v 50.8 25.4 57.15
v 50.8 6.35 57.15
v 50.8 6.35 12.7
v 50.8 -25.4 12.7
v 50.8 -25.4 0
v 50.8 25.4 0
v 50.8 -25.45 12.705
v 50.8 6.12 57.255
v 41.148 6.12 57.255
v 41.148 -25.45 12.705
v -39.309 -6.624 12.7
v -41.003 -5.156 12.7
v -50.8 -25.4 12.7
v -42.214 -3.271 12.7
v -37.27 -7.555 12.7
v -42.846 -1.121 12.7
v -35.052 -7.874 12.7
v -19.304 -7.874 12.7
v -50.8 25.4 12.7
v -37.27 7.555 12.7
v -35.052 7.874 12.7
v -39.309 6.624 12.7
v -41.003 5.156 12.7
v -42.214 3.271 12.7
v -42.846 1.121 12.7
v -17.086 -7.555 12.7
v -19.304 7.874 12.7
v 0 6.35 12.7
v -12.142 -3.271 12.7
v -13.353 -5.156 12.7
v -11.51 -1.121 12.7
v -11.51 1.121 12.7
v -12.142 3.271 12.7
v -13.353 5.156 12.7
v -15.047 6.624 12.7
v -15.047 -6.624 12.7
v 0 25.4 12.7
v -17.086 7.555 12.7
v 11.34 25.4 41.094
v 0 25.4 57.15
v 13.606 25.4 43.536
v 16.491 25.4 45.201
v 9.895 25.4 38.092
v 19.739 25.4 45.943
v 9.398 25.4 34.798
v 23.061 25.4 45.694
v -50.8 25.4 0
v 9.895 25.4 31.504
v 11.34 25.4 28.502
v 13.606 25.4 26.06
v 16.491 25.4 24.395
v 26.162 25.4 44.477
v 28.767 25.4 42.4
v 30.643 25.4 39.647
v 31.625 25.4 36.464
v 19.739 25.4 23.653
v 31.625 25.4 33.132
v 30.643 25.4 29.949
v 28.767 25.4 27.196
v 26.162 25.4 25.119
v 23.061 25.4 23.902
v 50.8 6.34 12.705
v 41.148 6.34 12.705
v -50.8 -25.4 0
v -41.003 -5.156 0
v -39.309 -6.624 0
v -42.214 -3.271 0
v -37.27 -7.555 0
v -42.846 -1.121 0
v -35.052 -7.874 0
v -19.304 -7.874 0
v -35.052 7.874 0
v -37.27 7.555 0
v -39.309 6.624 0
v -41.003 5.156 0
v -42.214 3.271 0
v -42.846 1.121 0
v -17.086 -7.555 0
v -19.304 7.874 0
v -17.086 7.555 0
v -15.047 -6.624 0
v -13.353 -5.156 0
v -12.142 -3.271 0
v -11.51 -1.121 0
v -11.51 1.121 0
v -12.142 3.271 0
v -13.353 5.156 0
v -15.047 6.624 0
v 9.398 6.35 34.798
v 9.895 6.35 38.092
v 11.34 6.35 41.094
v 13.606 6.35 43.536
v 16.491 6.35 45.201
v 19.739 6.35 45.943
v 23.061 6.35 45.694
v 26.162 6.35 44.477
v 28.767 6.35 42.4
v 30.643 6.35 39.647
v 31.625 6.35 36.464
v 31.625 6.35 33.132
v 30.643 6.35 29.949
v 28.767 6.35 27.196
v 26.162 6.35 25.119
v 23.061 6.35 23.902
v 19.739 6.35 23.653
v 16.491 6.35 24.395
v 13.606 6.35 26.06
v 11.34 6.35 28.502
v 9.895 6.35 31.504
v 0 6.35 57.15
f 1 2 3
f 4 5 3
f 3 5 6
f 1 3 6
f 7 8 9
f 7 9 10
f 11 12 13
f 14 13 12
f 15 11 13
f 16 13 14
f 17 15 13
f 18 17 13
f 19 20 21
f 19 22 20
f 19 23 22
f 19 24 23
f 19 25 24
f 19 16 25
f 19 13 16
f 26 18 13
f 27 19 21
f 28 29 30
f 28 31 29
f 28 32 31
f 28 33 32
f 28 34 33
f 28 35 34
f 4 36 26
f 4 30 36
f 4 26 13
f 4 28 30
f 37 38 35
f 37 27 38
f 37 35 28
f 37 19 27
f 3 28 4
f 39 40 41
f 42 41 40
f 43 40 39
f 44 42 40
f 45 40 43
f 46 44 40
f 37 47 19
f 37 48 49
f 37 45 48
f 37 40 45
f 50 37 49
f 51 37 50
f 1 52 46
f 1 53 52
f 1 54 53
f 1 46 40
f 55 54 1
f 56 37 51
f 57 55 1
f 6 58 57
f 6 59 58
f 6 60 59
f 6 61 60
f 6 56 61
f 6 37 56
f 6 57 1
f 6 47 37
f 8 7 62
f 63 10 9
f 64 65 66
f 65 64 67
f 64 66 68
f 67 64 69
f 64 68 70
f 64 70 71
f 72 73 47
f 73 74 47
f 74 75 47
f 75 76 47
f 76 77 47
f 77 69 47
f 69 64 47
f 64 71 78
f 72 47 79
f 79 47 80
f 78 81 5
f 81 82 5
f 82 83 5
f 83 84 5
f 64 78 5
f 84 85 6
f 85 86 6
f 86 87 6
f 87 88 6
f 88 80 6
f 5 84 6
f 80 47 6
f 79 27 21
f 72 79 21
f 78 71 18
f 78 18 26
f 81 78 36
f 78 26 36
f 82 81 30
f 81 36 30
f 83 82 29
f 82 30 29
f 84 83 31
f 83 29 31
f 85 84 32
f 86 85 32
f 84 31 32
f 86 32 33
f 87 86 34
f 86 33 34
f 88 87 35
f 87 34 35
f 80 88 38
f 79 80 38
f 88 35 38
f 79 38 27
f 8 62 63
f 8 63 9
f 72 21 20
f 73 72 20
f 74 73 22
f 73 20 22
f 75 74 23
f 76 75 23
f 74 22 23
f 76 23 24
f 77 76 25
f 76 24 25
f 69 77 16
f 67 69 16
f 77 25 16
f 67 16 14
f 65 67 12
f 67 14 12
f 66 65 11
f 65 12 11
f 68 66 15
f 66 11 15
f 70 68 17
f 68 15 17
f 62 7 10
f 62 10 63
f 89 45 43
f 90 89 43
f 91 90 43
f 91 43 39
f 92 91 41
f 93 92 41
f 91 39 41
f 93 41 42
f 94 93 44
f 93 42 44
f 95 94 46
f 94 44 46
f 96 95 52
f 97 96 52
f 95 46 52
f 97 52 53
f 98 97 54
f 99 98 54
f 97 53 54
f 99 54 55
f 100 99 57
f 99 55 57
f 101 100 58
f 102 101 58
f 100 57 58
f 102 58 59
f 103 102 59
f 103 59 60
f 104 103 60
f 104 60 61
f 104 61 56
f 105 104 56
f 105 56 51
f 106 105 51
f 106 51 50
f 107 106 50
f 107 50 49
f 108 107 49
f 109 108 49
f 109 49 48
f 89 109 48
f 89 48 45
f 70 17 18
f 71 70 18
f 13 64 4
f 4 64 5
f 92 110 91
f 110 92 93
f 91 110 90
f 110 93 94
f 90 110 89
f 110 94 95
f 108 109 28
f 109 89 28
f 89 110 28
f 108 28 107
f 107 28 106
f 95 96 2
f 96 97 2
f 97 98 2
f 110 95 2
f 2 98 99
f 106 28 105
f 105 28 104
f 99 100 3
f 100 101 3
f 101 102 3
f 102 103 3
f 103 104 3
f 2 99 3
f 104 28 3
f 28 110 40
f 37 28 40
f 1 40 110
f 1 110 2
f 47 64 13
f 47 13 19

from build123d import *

# Parameters (mm, degrees)
F0_W     = 101.6
F0_H     = 50.8
F1_DEPTH = 12.7
F2_W     = 50.8
F2_H     = 19.05
F3_DEPTH = 44.45
F5_D     = 22.352
F7_DEPTH = 9.652
F9_DEPTH = 25.4


with BuildPart() as f1:
    # F0 (on Top) → F1 (new body)
    with BuildSketch(Plane.XY):
        Rectangle(F0_W, F0_H)
    extrude(amount=F1_DEPTH)

    # F2 (on face) → F3 (join)
    with BuildSketch(Plane.XY.offset(12.7)):
        with Locations((25.4, 15.875)):
            Rectangle(F2_W, F2_H)
    extrude(amount=F3_DEPTH)

    # F5 (through all)
    with Locations(Plane.XZ.offset(-6.35)):
        with Locations((20.574, 34.798)):
            Hole(F5_D / 2)

    # F8 (on face) → F9 (cut)
    with BuildSketch(Plane.XY.offset(12.7)):
        with BuildLine():
            Line((-19.304, 7.874), (-35.052, 7.874))
            ThreePointArc((-35.052, 7.874), (-42.926, 0), (-35.052, -7.874))
            Line((-35.052, -7.874), (-19.304, -7.874))
            ThreePointArc((-19.304, -7.874), (-11.43, 0), (-19.304, 7.874))
        make_face()
    extrude(amount=-F9_DEPTH, mode=Mode.SUBTRACT)


with BuildPart() as f7:
    # F6 (on face) → F7 (new body)
    with BuildSketch(Plane.YZ.offset(50.8)):
        Polygon((6.339903, 12.705463), (6.119906, 57.254743), (-25.449583, 12.705463), align=None)
    extrude(amount=-F7_DEPTH)


solid = Compound([f1.part, f7.part])
